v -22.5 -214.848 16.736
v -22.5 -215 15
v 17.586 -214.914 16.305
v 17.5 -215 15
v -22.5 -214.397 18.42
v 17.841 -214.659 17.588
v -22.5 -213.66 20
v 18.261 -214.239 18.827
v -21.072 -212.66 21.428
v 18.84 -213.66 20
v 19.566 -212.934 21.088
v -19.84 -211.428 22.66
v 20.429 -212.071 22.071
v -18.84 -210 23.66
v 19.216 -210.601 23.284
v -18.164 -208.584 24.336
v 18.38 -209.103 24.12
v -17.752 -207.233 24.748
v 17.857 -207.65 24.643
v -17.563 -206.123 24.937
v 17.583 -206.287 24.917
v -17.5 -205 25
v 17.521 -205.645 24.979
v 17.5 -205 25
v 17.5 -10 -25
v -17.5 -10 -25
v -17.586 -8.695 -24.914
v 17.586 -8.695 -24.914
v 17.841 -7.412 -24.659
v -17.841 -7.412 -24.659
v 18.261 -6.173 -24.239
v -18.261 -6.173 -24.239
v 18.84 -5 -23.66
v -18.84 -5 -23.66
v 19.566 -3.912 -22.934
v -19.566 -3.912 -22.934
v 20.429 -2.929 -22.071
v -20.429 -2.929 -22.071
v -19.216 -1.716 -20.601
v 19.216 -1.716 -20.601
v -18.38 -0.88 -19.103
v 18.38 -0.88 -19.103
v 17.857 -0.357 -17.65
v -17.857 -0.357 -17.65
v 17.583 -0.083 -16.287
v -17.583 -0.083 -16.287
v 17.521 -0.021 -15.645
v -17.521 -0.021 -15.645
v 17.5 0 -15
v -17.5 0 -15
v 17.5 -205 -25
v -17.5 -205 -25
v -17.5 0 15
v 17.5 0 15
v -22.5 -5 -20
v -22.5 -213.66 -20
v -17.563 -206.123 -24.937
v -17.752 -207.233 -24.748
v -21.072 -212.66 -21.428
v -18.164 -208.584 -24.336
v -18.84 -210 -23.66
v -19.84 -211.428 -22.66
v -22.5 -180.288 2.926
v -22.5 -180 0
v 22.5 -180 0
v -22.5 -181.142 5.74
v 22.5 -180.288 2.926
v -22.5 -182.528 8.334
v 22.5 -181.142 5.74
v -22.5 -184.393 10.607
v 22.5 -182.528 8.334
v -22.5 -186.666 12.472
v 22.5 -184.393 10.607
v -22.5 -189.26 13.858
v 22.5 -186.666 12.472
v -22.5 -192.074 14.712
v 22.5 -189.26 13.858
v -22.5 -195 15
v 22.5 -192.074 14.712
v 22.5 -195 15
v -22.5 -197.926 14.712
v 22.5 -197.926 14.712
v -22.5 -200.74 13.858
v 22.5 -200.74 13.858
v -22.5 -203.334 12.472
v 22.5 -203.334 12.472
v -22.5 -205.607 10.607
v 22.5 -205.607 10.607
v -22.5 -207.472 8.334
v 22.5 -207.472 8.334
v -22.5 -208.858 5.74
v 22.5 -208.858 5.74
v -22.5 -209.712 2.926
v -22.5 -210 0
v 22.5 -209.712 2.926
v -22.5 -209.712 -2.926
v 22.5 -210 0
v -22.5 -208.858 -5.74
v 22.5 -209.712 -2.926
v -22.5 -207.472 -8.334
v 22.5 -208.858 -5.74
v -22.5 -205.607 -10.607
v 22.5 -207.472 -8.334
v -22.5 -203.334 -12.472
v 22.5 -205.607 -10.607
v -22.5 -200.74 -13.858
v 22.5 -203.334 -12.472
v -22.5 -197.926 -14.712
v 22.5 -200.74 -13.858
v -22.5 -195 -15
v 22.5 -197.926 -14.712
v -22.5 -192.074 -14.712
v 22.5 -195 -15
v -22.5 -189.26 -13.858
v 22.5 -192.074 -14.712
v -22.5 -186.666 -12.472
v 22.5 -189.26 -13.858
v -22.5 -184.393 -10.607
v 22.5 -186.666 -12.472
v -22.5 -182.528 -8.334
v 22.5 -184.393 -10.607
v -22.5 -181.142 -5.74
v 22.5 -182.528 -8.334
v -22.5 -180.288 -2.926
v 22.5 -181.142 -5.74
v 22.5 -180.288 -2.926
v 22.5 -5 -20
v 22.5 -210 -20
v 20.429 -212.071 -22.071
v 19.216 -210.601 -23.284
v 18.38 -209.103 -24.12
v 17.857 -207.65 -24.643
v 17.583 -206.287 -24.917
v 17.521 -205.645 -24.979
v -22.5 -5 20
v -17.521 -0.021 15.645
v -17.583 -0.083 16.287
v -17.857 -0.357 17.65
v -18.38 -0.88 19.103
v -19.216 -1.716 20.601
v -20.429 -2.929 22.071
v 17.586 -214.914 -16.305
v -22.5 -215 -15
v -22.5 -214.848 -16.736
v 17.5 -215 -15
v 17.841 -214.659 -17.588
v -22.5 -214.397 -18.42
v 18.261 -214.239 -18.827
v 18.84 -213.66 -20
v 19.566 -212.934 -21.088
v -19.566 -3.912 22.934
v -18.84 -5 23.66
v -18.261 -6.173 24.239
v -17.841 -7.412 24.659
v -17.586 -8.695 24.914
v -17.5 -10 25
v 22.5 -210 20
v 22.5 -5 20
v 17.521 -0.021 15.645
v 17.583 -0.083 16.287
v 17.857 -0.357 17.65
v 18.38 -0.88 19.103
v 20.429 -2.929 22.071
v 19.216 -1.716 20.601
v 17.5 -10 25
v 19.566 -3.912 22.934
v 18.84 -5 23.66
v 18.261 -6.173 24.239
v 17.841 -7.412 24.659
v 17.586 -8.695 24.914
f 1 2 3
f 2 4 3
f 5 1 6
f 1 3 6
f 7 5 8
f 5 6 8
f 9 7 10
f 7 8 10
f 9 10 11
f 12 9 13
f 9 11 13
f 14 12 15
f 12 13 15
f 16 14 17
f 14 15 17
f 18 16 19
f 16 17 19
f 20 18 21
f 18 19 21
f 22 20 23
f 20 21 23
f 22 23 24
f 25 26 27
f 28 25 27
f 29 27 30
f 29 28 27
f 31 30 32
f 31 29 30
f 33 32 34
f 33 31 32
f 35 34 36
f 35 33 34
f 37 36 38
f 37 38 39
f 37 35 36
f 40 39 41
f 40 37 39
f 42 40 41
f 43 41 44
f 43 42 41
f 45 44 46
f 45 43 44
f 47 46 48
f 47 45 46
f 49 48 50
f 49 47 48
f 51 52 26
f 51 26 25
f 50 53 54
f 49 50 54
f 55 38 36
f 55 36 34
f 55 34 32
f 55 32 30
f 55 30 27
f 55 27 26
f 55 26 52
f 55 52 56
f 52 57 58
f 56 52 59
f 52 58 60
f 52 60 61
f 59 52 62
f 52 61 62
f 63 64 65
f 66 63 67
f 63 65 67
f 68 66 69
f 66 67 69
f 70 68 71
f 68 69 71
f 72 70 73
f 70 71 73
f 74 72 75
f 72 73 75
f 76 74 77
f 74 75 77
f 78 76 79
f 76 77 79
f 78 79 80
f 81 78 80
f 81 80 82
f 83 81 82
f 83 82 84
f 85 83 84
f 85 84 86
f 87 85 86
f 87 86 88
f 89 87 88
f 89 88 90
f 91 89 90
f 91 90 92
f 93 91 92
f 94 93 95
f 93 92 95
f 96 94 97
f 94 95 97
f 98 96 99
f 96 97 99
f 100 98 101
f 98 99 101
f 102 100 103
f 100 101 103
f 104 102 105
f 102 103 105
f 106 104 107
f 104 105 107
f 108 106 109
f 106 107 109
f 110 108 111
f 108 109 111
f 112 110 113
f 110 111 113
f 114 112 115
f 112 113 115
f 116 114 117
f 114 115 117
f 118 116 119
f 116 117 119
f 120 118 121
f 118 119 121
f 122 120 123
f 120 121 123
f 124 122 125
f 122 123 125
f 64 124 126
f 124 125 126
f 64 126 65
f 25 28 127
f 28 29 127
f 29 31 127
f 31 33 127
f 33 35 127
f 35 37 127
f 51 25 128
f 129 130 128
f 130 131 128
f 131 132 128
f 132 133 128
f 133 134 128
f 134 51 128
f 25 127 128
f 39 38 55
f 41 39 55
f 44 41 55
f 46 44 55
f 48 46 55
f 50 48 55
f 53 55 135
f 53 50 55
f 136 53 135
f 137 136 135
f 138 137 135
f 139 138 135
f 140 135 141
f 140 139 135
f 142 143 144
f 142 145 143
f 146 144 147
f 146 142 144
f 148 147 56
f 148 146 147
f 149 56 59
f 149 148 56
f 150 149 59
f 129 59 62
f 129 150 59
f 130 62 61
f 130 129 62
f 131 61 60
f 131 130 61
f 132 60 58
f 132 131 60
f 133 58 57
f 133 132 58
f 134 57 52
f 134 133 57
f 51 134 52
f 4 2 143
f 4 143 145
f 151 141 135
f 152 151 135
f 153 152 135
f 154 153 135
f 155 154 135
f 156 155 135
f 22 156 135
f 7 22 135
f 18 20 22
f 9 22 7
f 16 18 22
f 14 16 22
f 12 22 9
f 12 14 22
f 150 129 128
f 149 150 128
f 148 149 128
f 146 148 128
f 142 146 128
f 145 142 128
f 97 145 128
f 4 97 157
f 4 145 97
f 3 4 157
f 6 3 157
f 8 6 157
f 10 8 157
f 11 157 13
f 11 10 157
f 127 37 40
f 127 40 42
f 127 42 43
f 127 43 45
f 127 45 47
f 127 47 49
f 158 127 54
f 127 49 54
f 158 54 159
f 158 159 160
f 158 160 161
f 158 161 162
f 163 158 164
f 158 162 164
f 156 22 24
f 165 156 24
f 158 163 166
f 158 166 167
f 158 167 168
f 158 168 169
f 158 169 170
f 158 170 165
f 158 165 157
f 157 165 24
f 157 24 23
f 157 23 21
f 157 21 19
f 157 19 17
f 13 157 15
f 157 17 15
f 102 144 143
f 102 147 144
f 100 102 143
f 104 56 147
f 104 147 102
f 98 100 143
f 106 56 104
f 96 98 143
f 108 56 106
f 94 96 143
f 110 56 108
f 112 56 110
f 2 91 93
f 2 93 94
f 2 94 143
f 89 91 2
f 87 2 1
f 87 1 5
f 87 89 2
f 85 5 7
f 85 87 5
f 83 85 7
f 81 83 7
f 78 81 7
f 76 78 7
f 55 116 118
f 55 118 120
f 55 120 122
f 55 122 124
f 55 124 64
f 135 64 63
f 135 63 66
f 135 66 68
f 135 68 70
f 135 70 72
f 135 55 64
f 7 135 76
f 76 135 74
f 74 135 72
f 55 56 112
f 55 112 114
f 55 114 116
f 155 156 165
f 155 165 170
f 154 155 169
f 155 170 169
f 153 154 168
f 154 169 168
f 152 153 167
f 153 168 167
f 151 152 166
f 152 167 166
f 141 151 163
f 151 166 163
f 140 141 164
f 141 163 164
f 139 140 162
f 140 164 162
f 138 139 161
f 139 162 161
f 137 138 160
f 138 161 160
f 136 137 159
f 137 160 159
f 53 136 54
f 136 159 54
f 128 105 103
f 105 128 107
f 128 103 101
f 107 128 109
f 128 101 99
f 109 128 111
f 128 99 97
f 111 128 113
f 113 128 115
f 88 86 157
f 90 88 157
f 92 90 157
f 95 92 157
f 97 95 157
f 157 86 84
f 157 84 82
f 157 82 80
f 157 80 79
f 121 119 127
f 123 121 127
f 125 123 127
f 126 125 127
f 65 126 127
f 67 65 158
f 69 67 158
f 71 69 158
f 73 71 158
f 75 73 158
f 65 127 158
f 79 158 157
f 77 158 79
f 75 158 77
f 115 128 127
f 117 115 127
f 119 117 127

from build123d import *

# Parameters (mm, degrees)
F0_W     = 45
F0_H     = 50
F1_DEPTH = 215
F2_SIZE  = 5
F3_R     = 10
F5_DEPTH = 45.001


with BuildPart() as f1:
    # F0 (on Front) → F1 (new body)
    with BuildSketch(Plane.XZ):
        Rectangle(F0_W, F0_H)
    extrude(amount=F1_DEPTH)

    # F2
    f2_edges = [f1.edges().sort_by_distance(p)[0] for p in [
        (22.5, -107.5, 25),
        (-22.5, -107.5, 25),
        (22.5, -107.5, -25),
        (-22.5, -107.5, -25),
        (22.5, -215, 0),
        (22.5, 0, 0),
        (-22.5, 0, 0),
    ]]
    chamfer(f2_edges, length=F2_SIZE)

    # F3
    f3_edges = [f1.edges().sort_by_distance(p)[0] for p in [
        (0, -215, 25),
        (0, -215, -25),
        (0, 0, 25),
        (0, 0, -25),
    ]]
    fillet(f3_edges, radius=F3_R)

    # F4 (on face) → F5 (cut, through all)
    with BuildSketch(Plane.YZ.offset(22.5)):
        with BuildLine():
            ThreePointArc((-210, 8.56e-08), (-195.0000000428, -15), (-180, 0))
            ThreePointArc((-180, 0), (-194.9999999572, 15), (-210, 8.56e-08))
        make_face()
    extrude(amount=-F5_DEPTH, mode=Mode.SUBTRACT)


solid = f1.part
